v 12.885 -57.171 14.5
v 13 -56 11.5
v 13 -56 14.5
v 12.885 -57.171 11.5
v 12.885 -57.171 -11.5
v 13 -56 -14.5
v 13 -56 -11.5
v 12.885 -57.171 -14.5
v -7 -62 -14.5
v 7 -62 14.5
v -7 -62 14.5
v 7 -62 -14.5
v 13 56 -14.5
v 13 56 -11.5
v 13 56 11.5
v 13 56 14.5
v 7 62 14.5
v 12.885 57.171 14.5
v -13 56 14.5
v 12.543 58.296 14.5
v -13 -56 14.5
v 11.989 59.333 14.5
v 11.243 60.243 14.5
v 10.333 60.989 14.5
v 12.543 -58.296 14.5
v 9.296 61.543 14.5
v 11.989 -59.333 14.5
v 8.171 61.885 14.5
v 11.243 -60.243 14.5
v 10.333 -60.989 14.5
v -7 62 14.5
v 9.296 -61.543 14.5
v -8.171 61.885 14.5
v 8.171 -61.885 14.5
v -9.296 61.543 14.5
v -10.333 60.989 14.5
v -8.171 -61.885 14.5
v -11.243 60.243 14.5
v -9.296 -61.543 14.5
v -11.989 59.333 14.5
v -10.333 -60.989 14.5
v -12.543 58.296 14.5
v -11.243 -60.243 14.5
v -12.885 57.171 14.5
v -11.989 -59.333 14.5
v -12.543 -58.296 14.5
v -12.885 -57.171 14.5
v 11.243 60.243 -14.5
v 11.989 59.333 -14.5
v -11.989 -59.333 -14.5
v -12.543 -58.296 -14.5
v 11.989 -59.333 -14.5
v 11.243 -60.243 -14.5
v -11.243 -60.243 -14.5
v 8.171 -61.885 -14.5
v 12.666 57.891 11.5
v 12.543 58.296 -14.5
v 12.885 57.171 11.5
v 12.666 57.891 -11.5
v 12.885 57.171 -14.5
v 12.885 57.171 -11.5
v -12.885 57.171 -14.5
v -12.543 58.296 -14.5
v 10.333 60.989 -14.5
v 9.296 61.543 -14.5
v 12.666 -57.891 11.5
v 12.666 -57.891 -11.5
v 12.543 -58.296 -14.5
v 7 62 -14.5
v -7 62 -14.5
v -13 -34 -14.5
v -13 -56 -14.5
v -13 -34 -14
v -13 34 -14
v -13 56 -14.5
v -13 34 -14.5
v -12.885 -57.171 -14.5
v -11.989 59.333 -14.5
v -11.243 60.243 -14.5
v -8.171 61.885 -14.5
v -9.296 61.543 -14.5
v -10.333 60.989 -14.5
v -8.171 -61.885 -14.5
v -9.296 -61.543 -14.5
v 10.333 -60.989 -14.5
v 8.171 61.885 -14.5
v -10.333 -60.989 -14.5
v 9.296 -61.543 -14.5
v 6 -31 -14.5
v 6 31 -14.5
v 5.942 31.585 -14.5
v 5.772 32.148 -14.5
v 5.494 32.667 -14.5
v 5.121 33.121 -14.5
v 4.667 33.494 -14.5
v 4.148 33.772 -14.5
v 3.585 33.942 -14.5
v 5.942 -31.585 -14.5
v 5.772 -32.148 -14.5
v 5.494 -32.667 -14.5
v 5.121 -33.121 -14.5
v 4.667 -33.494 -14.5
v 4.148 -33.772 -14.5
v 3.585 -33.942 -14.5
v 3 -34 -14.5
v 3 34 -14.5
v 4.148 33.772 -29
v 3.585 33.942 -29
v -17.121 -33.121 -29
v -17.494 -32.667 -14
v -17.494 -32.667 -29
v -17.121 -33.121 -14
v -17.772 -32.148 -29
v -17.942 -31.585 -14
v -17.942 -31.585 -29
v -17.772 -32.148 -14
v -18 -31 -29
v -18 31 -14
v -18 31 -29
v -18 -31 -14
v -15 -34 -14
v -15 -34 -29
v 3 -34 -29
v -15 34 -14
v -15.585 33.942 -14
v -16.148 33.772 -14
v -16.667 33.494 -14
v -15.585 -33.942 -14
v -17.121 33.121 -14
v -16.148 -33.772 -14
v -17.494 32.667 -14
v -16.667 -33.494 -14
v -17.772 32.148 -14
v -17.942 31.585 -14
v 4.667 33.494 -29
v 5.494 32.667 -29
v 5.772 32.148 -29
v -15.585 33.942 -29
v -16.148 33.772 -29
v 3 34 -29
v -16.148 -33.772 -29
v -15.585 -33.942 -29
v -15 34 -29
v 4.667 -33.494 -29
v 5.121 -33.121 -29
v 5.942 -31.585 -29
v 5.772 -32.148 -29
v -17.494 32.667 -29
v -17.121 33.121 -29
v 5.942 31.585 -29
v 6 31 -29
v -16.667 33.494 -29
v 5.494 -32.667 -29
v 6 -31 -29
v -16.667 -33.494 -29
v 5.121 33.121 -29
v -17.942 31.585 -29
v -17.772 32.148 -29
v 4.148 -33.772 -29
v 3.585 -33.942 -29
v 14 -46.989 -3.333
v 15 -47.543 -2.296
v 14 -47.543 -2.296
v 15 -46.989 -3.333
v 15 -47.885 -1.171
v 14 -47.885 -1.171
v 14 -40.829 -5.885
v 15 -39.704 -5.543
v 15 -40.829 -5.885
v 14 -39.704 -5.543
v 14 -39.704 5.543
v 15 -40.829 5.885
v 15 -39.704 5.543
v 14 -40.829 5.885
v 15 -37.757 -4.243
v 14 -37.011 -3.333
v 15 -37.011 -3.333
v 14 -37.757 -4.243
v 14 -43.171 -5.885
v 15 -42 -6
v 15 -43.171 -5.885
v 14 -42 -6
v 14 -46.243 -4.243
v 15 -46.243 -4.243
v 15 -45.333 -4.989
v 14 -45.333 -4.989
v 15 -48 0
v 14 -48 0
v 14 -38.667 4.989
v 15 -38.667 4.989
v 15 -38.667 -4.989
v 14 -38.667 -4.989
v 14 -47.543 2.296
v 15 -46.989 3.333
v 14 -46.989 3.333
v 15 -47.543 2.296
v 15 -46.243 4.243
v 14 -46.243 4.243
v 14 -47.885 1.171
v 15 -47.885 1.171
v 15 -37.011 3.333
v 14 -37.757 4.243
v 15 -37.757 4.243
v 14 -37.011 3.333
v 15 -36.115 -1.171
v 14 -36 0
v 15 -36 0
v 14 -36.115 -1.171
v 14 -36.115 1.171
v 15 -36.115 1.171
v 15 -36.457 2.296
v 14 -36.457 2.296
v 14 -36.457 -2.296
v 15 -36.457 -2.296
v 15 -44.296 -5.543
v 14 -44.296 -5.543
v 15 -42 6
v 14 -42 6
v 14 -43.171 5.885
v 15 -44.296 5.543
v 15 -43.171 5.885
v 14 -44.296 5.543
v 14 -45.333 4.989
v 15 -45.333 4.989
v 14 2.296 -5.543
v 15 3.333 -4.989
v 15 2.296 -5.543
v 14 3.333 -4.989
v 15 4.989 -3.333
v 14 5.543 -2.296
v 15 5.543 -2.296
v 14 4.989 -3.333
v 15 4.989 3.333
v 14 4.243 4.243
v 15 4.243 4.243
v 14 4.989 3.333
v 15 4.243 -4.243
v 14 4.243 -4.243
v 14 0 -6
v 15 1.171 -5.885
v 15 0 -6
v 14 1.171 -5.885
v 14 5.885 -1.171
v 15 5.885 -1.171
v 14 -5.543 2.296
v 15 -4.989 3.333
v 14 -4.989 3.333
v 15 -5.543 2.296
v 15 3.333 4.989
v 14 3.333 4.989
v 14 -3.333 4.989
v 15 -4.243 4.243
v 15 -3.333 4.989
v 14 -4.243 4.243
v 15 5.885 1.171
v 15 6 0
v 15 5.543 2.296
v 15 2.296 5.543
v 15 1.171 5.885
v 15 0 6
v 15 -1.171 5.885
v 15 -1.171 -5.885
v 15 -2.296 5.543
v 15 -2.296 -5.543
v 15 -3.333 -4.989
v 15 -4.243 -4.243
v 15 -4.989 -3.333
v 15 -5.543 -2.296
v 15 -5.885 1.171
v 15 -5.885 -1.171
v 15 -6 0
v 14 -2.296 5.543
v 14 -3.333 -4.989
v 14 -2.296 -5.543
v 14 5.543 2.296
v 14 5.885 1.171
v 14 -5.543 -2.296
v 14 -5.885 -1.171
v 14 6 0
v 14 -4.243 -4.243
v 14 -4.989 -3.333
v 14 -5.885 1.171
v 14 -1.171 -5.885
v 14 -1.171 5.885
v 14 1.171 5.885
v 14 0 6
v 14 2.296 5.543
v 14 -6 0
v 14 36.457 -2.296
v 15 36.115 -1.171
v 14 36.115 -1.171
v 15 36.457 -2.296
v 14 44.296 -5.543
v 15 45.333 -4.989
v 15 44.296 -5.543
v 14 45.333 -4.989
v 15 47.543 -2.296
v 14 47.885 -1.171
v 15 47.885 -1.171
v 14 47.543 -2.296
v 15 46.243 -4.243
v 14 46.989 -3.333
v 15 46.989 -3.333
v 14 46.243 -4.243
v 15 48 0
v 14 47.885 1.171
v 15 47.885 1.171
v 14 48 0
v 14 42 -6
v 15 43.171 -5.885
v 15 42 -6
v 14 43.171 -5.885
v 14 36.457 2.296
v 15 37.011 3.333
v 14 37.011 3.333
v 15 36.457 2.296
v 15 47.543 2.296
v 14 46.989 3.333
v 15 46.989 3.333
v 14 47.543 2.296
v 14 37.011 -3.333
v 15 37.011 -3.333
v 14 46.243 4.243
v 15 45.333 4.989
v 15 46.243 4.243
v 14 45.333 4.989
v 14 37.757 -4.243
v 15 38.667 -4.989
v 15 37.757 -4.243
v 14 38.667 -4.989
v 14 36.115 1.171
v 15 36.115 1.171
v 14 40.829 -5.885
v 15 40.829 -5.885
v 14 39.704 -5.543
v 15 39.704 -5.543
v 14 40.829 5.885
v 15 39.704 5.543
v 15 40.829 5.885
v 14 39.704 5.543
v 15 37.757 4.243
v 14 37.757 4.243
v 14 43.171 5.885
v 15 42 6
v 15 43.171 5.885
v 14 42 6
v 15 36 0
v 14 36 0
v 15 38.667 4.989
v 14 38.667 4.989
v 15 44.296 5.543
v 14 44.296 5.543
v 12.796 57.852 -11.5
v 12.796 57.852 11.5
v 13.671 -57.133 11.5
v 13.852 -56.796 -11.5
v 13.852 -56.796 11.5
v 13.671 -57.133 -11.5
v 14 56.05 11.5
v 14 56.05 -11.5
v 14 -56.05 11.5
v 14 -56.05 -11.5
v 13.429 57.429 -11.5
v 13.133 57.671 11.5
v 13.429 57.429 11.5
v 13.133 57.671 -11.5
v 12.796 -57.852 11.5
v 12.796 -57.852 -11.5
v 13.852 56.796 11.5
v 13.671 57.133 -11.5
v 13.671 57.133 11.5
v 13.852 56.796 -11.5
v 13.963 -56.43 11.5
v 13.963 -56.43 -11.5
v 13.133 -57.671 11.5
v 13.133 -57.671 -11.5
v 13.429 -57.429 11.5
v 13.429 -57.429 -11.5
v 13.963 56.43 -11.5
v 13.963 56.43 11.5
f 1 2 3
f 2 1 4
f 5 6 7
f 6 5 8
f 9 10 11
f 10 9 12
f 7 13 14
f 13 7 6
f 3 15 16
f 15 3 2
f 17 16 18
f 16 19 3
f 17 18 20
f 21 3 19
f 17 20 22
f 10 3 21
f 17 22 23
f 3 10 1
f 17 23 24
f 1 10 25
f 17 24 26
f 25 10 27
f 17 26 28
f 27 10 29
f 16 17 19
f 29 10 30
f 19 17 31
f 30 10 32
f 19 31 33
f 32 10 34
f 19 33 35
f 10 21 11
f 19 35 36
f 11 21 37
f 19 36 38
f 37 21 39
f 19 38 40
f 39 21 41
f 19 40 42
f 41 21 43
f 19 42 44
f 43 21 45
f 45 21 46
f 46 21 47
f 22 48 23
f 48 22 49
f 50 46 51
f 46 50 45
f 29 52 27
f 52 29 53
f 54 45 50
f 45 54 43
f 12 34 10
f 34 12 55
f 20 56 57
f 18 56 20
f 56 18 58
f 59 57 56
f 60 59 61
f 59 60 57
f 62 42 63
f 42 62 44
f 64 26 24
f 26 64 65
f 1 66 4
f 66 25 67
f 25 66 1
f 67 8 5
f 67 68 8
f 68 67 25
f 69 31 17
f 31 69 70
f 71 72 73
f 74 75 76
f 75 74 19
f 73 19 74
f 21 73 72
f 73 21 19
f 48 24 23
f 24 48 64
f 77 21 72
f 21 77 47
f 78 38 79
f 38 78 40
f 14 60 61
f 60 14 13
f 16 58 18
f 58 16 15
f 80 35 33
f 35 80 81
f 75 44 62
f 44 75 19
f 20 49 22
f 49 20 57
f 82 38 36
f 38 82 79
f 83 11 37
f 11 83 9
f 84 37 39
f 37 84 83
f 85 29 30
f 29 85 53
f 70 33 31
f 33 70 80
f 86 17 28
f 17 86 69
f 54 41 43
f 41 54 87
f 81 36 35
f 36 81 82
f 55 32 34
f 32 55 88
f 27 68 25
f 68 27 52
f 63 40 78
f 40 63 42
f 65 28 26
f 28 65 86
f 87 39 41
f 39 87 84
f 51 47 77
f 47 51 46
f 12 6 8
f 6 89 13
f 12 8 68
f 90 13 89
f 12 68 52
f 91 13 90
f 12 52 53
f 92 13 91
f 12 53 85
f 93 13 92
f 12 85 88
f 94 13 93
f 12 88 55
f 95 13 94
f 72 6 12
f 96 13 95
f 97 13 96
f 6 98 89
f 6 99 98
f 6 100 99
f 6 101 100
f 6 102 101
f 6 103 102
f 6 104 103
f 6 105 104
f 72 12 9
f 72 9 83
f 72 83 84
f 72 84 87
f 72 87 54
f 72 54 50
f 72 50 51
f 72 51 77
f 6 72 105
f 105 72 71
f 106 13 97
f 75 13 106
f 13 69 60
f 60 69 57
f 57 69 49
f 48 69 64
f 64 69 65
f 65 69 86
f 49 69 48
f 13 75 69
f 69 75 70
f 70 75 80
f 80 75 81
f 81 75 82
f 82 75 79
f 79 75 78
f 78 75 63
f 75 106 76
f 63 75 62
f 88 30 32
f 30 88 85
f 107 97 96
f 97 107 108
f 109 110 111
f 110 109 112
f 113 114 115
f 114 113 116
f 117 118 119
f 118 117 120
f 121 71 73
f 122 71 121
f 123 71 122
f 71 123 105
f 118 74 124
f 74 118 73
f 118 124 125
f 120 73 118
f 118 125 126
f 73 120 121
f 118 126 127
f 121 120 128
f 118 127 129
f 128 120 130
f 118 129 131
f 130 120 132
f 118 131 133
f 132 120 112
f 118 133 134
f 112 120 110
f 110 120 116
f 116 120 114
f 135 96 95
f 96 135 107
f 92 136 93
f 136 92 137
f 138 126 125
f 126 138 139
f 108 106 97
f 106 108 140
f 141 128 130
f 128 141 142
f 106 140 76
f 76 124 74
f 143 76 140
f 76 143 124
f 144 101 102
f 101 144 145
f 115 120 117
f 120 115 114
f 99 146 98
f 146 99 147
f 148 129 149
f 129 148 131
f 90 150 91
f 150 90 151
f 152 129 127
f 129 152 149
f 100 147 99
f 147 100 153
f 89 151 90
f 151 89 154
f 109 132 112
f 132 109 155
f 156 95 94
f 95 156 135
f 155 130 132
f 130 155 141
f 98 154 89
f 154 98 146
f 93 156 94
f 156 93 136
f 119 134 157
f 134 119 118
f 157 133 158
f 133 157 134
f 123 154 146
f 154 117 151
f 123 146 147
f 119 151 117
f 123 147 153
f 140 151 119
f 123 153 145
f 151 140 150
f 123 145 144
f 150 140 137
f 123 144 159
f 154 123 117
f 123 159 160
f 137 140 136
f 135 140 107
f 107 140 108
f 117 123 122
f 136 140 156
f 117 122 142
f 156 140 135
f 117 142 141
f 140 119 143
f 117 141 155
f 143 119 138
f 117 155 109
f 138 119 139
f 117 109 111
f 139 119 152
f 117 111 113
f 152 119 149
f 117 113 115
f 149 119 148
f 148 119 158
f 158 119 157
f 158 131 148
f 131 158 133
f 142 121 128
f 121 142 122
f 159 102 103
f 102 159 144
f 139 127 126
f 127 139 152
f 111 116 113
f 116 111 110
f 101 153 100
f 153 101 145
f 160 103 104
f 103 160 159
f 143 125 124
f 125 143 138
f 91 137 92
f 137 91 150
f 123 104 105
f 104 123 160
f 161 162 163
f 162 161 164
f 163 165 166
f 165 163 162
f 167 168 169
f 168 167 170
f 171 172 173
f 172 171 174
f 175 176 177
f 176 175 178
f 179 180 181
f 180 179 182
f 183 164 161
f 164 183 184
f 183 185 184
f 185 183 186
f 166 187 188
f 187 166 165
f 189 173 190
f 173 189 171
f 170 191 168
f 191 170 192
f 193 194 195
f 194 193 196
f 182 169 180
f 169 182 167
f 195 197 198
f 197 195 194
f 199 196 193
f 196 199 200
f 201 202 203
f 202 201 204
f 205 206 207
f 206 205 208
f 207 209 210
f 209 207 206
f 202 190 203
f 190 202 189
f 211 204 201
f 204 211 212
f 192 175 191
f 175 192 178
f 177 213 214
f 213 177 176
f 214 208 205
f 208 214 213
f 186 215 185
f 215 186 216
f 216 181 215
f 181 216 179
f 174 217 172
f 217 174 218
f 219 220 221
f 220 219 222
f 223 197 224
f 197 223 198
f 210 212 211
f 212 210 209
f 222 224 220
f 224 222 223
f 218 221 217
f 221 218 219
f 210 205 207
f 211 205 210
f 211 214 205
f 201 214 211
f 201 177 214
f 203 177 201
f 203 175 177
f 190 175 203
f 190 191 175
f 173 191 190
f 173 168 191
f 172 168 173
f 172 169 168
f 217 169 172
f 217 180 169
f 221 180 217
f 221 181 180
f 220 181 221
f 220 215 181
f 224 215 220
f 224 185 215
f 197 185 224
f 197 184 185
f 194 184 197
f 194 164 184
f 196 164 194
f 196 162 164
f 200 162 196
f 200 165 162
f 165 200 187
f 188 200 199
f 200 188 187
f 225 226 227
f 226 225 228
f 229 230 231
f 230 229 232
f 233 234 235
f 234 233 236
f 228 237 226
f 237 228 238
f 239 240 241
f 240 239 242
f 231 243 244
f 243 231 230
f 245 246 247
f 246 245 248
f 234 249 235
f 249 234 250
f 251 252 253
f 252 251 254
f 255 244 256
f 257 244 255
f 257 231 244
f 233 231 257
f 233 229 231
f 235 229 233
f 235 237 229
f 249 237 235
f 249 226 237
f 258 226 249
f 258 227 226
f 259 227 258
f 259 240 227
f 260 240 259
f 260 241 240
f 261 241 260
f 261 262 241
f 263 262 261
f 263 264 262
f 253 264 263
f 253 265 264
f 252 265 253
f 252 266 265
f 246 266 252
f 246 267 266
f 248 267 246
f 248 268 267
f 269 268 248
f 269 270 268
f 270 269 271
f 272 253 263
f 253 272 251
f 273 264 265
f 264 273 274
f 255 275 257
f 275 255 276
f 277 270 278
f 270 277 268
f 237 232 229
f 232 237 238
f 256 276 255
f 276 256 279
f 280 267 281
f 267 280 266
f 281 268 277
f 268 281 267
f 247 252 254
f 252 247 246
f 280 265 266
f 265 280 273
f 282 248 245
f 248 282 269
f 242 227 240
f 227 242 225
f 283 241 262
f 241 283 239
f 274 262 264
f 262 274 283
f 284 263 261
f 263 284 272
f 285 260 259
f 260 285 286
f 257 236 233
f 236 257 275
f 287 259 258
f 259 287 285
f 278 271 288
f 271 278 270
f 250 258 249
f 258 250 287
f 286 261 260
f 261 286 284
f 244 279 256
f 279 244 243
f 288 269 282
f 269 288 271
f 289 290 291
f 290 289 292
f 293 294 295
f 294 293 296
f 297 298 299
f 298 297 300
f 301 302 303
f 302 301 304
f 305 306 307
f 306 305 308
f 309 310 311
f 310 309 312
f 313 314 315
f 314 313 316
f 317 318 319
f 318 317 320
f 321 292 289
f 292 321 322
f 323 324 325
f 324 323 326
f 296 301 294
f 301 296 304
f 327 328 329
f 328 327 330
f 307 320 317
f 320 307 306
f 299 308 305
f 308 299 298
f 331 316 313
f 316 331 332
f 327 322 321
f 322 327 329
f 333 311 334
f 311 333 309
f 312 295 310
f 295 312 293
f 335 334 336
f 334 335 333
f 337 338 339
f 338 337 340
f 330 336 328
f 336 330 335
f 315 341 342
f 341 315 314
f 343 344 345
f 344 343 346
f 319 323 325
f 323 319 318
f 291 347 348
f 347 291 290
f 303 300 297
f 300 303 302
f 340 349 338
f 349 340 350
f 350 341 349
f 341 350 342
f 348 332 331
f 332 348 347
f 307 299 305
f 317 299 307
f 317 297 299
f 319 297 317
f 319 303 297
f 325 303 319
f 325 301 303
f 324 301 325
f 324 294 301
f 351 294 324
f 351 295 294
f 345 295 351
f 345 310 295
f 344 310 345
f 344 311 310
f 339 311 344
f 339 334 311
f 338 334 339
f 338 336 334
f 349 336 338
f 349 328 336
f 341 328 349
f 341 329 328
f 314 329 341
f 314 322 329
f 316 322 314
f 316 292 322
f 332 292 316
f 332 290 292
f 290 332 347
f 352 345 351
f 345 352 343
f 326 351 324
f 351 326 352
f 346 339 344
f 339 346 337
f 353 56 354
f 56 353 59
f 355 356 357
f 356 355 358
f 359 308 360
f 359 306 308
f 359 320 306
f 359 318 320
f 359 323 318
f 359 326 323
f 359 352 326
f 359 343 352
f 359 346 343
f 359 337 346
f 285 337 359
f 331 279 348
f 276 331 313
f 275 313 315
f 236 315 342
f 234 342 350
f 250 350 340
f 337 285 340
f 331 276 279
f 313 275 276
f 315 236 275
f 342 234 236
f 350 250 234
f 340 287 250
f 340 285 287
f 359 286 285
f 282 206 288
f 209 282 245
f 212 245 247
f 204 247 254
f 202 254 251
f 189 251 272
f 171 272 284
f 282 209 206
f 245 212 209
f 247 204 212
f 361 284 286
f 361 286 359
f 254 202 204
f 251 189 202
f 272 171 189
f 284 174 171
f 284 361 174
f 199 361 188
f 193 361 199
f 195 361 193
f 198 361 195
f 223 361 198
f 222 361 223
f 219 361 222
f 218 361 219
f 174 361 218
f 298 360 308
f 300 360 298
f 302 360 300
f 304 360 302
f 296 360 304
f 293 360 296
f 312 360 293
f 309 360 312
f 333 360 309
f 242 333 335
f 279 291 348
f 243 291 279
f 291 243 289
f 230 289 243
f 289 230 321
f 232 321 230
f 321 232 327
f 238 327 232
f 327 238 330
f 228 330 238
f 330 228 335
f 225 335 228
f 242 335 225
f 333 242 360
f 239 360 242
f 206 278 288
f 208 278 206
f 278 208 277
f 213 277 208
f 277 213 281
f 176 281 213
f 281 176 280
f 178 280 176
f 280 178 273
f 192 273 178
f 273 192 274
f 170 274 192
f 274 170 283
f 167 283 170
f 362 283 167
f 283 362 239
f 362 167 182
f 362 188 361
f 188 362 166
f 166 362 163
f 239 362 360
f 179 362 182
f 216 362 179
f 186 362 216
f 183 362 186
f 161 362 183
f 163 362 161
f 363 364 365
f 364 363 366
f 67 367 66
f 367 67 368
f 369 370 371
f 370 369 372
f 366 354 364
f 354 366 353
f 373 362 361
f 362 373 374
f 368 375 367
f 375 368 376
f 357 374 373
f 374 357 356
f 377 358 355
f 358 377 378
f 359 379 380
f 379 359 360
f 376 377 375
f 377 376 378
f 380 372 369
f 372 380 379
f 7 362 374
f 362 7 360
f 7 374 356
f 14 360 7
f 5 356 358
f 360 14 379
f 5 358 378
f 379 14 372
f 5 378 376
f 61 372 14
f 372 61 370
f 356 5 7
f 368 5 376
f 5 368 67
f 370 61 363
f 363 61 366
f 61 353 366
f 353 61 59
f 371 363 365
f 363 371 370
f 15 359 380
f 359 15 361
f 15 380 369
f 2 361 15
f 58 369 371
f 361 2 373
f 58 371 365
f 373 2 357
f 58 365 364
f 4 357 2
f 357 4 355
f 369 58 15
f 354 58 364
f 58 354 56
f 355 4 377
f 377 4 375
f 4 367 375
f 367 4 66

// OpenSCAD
// ============================================================================
// FILE: export_camera.scad
// OUTPUT: camera_visual.stl
// PURPOSE: Export only the Intel RealSense D455 camera and mounting bracket.
// ============================================================================

// Chi nap module va function tu main.scad.
// Khong chay factory_scene() trong main.scad.
use <main.scad>


// ============================================================================
// RENDER SETTINGS
// Units: millimeters
// ============================================================================

eps = 0.05;

quality = "render";

preview_fn = 32;
render_fn  = 72;

$fn = quality == "render"
    ? render_fn
    : preview_fn;


// ============================================================================
// PARAMETERS REQUIRED BY realsense_d455()
// ============================================================================

// Camera position in the original robot coordinate system
camera_pos_x        = 415;
camera_mount_height = 285;


// Camera housing dimensions
d455_length = 26;
d455_width  = 124;
d455_height = 29;


// Disable component labels during STL export
show_component_labels = false;


// ============================================================================
// CAMERA EXPORT
// ============================================================================
//
// Original camera housing center:
//
// X = camera_pos_x        = 415 mm
// Y = 0 mm
// Z = camera_mount_height = 285 mm
//
// The translation moves the camera housing center to STL origin [0, 0, 0].
//
// In URDF, restore the camera position using:
//
// origin xyz="0.415 0 0.285"
// ============================================================================

translate([
    -camera_pos_x,
    0,
    -camera_mount_height
])
    realsense_d455();
